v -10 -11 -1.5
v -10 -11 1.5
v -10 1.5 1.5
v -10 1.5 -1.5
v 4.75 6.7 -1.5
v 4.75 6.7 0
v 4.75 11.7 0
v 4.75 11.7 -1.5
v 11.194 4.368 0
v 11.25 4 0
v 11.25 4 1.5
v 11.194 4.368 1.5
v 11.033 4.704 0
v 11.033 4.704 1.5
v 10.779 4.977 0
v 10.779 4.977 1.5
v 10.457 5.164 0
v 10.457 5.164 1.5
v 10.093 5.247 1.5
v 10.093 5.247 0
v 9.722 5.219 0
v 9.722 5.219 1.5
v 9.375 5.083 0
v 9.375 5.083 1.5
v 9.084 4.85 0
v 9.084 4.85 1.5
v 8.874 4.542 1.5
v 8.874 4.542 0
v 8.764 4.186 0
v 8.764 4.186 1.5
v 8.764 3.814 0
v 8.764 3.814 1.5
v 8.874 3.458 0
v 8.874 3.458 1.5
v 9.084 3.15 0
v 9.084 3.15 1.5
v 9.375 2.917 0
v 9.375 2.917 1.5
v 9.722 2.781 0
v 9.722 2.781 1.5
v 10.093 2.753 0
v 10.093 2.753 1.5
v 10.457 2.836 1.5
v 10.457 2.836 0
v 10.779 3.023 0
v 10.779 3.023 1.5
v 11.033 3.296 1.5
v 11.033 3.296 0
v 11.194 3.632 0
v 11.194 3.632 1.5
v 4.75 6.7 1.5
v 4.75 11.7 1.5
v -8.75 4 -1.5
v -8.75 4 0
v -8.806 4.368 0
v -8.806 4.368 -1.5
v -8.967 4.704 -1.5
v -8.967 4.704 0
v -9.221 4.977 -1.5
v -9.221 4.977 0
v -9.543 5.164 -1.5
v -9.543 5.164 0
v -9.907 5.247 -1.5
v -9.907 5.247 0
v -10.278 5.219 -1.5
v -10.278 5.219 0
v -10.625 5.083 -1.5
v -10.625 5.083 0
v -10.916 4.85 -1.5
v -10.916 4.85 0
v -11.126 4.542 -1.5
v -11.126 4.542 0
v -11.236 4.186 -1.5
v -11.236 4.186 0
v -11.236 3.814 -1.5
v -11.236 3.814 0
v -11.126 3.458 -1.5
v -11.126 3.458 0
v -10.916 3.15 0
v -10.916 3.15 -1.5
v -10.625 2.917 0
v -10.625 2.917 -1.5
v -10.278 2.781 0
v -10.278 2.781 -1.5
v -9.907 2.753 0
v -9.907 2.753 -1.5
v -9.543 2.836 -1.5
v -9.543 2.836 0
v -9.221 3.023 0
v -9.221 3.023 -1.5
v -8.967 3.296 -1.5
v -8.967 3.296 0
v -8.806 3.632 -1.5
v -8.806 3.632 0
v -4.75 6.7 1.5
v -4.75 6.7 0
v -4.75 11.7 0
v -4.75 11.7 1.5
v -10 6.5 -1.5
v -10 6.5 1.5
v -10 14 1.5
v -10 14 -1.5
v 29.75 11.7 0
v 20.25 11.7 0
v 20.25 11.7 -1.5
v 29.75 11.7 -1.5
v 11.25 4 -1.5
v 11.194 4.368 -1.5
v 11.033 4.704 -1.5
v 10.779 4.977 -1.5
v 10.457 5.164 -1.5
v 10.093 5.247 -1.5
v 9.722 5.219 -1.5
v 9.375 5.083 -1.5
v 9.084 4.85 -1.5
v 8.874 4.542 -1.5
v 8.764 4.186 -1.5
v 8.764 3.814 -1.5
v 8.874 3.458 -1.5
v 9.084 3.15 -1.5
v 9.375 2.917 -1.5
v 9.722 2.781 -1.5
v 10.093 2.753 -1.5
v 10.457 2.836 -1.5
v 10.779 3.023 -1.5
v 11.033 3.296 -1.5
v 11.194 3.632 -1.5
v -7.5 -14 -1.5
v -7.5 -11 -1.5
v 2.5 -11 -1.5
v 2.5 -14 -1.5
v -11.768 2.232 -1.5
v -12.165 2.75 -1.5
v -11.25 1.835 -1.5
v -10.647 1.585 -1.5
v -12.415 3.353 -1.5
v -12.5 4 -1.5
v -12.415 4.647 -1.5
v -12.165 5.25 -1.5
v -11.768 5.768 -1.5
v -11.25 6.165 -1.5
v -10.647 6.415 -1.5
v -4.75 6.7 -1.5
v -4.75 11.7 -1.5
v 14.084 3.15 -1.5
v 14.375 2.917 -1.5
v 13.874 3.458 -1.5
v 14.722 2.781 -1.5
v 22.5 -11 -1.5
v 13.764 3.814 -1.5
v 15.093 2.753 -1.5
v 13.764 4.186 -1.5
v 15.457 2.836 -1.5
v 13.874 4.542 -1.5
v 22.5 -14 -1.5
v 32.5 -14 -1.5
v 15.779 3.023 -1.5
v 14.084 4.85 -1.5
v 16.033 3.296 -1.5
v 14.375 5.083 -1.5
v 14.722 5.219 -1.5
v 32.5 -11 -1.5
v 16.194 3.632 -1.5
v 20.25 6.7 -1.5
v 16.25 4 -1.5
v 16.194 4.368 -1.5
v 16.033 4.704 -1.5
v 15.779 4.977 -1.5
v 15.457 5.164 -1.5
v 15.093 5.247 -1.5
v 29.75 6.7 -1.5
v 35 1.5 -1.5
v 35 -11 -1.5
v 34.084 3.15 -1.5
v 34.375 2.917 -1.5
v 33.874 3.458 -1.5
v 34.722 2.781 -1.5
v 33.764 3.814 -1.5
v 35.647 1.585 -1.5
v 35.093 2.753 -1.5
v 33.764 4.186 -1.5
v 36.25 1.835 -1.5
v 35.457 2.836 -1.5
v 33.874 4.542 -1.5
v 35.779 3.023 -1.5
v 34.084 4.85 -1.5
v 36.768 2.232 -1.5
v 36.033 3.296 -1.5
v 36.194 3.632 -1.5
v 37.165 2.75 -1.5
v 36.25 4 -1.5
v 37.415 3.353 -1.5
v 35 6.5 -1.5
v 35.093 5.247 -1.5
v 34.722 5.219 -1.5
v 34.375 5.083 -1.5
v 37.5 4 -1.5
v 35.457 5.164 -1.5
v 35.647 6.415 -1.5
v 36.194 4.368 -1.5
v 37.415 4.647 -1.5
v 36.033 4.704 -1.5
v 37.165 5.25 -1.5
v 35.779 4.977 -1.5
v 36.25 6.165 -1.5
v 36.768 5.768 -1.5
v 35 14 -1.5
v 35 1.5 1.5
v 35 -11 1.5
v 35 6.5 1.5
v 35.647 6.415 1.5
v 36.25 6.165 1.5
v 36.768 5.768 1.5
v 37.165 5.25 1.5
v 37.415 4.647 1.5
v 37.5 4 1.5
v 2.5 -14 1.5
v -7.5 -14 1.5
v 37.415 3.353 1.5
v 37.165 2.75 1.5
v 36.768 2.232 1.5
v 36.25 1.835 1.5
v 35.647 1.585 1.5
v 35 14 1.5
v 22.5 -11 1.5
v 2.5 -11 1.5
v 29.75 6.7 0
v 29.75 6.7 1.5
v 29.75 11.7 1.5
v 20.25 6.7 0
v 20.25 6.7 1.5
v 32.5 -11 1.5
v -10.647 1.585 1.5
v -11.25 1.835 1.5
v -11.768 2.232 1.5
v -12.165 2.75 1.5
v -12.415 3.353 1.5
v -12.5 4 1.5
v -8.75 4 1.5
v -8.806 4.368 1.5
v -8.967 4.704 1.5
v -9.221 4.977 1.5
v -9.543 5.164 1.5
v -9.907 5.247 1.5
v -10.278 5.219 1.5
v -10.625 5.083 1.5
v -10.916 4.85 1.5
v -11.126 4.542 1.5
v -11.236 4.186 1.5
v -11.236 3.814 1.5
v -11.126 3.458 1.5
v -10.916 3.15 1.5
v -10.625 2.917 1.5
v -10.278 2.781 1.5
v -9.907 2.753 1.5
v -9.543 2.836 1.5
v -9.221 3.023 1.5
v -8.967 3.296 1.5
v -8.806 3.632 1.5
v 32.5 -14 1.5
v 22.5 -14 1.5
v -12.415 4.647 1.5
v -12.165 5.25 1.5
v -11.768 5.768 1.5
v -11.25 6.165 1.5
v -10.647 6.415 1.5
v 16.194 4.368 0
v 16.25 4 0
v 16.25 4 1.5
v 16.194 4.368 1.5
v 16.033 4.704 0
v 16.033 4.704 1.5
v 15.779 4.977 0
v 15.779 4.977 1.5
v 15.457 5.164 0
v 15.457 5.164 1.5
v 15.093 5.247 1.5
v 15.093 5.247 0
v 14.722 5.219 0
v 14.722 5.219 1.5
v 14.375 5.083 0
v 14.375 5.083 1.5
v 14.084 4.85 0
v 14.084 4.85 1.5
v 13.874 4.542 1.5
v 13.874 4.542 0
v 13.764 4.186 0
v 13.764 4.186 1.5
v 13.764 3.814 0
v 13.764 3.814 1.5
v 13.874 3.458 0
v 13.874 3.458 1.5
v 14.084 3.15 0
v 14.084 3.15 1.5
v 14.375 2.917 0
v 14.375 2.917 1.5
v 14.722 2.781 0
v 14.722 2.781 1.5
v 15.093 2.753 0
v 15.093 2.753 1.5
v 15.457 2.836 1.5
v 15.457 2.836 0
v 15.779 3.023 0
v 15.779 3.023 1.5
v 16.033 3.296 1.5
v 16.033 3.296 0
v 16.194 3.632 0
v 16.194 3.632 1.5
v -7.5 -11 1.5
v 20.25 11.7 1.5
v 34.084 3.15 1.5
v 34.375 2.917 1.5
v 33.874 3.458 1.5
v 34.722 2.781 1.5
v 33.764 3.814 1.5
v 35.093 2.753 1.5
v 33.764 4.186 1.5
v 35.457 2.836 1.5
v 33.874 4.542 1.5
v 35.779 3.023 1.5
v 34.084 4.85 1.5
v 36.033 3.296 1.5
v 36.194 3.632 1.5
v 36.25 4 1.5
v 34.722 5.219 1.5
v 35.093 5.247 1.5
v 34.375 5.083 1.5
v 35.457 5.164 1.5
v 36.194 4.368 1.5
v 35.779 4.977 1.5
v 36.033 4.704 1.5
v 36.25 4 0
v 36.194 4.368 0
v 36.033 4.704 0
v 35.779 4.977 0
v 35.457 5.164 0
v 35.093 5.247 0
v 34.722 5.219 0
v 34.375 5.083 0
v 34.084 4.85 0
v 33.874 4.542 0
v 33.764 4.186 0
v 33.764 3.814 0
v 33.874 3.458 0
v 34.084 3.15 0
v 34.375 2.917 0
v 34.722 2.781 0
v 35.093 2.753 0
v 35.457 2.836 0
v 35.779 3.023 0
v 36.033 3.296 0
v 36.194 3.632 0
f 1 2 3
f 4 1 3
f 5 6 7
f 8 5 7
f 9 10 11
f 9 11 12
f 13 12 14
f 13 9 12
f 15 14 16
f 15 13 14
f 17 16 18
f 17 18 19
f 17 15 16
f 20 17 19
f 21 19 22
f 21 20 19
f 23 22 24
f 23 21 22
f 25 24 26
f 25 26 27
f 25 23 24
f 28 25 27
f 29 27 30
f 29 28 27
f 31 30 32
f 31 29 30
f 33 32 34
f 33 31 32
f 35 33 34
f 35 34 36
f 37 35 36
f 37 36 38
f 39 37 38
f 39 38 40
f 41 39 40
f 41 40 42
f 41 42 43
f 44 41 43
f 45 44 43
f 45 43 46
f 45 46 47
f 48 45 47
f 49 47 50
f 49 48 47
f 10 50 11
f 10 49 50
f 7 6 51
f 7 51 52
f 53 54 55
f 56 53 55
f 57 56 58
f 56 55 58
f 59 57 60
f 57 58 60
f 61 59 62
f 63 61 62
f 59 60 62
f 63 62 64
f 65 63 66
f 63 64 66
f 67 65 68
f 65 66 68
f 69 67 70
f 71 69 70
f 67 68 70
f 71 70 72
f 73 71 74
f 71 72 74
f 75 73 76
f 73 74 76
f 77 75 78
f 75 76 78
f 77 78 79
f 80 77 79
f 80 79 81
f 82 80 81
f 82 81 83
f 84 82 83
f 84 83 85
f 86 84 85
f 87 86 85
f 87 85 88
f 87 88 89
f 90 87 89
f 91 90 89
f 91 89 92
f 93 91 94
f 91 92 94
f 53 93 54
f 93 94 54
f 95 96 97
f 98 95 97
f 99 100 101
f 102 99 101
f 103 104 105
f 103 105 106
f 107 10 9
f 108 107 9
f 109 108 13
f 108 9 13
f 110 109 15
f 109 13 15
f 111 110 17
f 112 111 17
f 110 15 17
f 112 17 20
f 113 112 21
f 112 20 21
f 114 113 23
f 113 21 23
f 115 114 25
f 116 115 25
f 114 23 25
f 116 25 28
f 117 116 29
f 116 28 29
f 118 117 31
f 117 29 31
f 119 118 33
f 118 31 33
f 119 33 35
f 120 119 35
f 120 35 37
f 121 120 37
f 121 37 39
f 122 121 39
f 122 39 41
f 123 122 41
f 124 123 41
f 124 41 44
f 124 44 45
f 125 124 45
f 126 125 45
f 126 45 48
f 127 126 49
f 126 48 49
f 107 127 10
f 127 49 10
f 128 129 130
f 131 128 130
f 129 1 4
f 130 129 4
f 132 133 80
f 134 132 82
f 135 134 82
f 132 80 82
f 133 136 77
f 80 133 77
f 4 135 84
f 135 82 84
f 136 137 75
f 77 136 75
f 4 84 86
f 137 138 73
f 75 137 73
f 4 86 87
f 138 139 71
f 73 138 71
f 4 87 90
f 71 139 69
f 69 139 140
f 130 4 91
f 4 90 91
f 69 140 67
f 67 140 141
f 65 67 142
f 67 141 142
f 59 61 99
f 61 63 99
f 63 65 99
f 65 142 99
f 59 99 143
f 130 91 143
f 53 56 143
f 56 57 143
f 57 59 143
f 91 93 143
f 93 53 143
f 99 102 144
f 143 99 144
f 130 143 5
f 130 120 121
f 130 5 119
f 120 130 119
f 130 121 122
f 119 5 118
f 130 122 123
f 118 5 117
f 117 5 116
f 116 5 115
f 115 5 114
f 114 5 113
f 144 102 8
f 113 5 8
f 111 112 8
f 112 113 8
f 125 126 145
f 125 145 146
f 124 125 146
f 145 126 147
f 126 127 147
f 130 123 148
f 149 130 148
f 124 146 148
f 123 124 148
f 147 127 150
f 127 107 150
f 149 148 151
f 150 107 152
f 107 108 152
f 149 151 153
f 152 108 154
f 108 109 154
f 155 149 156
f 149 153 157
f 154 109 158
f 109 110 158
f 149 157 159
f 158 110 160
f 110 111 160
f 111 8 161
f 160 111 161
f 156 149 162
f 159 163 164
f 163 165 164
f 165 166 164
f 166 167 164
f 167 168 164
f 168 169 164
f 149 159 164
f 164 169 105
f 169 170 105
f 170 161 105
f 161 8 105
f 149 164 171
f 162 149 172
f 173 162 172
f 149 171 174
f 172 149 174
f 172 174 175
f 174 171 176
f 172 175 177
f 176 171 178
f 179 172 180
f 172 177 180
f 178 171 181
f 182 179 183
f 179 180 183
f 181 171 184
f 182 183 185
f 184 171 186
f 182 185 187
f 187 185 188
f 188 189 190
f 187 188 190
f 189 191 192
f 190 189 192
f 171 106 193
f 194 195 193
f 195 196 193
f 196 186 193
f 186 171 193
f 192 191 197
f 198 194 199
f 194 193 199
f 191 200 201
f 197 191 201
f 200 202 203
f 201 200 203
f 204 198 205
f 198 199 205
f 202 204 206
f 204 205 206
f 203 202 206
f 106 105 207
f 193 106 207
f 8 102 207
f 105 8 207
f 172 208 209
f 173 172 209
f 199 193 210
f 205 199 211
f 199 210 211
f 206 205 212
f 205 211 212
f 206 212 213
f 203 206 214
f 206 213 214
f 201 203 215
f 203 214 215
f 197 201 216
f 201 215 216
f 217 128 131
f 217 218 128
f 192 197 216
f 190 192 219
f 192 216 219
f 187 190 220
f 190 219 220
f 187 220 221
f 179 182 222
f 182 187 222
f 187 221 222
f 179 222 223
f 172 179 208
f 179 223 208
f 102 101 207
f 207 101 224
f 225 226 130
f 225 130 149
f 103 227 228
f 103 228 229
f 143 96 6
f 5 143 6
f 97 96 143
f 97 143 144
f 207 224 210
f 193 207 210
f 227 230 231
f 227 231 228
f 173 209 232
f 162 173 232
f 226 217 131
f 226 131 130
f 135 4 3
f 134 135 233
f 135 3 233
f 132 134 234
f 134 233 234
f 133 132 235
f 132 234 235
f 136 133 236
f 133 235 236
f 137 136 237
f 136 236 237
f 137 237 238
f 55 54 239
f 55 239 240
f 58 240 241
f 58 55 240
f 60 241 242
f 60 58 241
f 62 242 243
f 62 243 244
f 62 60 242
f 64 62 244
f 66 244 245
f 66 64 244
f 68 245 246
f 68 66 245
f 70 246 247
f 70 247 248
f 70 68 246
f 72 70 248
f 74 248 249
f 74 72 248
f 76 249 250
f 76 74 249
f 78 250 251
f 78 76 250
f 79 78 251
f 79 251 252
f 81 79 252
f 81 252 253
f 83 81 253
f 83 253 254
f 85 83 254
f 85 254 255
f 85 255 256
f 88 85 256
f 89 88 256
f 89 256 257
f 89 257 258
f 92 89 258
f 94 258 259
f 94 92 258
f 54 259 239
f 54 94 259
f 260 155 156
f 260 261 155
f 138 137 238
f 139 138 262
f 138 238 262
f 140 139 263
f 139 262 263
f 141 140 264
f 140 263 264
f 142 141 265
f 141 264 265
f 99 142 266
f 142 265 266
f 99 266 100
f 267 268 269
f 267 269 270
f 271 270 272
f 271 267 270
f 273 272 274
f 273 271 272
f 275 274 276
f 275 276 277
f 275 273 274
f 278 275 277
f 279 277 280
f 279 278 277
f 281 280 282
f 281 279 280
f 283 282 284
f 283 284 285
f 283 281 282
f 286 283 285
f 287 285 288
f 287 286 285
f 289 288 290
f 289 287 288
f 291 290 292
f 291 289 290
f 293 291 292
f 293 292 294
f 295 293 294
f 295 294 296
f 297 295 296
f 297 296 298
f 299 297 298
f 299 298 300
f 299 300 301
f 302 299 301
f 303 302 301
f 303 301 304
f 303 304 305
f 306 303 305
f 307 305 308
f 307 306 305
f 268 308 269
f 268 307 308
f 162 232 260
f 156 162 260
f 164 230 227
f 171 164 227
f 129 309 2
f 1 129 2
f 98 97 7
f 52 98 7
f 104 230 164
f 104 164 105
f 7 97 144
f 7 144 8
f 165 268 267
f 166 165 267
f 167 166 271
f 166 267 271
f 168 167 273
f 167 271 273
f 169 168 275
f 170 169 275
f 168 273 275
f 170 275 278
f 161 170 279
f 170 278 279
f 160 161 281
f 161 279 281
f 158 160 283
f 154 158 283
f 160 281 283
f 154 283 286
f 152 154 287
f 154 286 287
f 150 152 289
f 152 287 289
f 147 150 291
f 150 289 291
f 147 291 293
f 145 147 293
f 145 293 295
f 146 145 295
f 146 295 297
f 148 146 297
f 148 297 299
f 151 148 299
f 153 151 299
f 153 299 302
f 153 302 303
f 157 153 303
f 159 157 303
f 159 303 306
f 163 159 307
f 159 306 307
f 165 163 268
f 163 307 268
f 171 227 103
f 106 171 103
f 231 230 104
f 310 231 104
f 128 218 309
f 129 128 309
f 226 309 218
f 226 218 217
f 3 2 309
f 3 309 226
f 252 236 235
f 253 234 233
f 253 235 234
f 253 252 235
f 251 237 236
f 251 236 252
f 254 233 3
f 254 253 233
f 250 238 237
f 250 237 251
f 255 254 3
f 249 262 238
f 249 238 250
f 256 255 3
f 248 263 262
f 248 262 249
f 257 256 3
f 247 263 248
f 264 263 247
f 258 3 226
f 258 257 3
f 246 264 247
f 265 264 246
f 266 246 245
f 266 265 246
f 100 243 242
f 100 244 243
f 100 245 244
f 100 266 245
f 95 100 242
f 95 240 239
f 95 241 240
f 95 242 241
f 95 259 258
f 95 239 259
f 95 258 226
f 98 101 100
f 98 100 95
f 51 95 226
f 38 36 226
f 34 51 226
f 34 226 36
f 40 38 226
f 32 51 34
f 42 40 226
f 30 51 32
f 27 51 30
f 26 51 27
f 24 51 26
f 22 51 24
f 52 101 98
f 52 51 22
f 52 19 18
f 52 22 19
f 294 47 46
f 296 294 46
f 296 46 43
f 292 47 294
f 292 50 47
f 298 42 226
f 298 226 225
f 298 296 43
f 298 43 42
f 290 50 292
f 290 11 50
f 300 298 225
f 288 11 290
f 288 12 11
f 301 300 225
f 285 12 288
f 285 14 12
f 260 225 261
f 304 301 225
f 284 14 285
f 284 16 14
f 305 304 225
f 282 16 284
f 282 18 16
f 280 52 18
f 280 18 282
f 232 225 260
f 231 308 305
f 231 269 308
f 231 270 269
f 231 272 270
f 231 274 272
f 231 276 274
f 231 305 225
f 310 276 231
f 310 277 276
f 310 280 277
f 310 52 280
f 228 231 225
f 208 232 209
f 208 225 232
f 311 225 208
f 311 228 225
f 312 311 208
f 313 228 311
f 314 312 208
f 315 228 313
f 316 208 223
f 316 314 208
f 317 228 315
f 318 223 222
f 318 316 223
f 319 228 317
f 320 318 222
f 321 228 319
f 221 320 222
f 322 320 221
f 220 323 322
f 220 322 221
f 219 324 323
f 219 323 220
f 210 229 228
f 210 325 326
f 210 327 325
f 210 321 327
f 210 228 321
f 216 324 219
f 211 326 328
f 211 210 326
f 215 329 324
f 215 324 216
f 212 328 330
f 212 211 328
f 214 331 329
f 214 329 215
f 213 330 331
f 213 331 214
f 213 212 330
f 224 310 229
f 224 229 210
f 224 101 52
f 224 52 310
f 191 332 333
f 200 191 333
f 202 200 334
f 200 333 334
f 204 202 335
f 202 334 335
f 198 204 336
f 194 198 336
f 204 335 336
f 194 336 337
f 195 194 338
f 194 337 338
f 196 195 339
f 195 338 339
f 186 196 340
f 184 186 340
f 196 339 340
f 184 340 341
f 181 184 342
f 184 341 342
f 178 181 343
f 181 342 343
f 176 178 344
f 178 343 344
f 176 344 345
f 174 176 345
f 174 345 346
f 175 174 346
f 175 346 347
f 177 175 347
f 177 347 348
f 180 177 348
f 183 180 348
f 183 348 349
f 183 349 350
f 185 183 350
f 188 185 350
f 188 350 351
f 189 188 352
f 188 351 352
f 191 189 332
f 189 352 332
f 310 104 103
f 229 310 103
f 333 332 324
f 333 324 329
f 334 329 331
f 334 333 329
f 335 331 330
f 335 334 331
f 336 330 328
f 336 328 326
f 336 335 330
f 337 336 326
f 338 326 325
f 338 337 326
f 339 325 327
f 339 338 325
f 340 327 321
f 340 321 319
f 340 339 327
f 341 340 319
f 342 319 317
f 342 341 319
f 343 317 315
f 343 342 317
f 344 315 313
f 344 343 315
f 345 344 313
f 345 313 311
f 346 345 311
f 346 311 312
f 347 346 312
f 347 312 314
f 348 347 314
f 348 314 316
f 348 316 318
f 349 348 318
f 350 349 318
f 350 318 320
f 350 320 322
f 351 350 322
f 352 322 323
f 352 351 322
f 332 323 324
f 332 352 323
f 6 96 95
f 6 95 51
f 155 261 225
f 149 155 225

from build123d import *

# Parameters (mm, degrees)
CROQUIS1_W              = 25
CROQUIS1_H              = 28
CROQUIS1_R              = 1.25
CROQUIS1_W_2            = 9.5
CROQUIS1_H_2            = 5
SALIENTE_EXTRUIR1_DEPTH = 1.5
CROQUIS4_W              = 20
CROQUIS4_H              = 3
CORTAR_EXTRUIR5_DEPTH   = 10


with BuildPart() as part:
    # Croquis1 → Saliente-Extruir1 (new, symmetric)
    # profile 1 of 2: a face of its own
    with BuildSketch(Plane.XY):
        Rectangle(CROQUIS1_W, CROQUIS1_H)
        with Locations((-10, 4)):
            Circle(CROQUIS1_R, mode=Mode.SUBTRACT)
        with Locations((10, 4)):
            Circle(CROQUIS1_R, mode=Mode.SUBTRACT)
        with Locations((0, 9.2)):
            Rectangle(CROQUIS1_W_2, CROQUIS1_H_2, mode=Mode.SUBTRACT)
    # profile 2 of 2: a face of its own
    with BuildSketch(Plane.XY):
        with Locations((25, 0)):
            Rectangle(CROQUIS1_W, CROQUIS1_H)
        with Locations((15, 4)):
            Circle(CROQUIS1_R, mode=Mode.SUBTRACT)
        with Locations((35, 4)):
            Circle(CROQUIS1_R, mode=Mode.SUBTRACT)
        with Locations((25, 9.2)):
            Rectangle(CROQUIS1_W_2, CROQUIS1_H_2, mode=Mode.SUBTRACT)
    extrude(amount=SALIENTE_EXTRUIR1_DEPTH, both=True)

    # Croquis4 → Cortar-Extruir5 (cut)
    with BuildSketch(Plane.XY.offset(1.5)):
        with BuildLine():
            Line((-10, 6.5), (-10, 14))
            Line((-10, 14), (-12.5, 14))
            Line((-12.5, 14), (-12.5, 4))
            ThreePointArc((-12.5, 4), (-11.767766953, 5.767766953), (-10, 6.5))
        make_face()
        with BuildLine():
            Line((-10, -11), (-10, 1.5))
            ThreePointArc((-10, 1.5), (-11.767766953, 2.232233047), (-12.5, 4))
            Line((-12.5, 4), (-12.5, -14))
            Line((-12.5, -14), (-7.5, -14))
            Line((-7.5, -14), (-7.5, -11))
            Line((-7.5, -11), (-10, -11))
        make_face()
        with Locations((12.5, -12.5)):
            Rectangle(CROQUIS4_W, CROQUIS4_H)
        with BuildLine():
            Line((37.5, -14), (37.5, 4))
            ThreePointArc((37.5, 4), (36.767766953, 2.232233047), (35, 1.5))
            Line((35, 1.5), (35, -11))
            Line((35, -11), (32.5, -11))
            Line((32.5, -11), (32.5, -14))
            Line((32.5, -14), (37.5, -14))
        make_face()
        with BuildLine():
            Line((37.5, 14), (35, 14))
            Line((35, 14), (35, 6.5))
            ThreePointArc((35, 6.5), (36.767766953, 5.767766953), (37.5, 4))
            Line((37.5, 4), (37.5, 14))
        make_face()
    extrude(amount=-CORTAR_EXTRUIR5_DEPTH, mode=Mode.SUBTRACT)


solid = part.part
